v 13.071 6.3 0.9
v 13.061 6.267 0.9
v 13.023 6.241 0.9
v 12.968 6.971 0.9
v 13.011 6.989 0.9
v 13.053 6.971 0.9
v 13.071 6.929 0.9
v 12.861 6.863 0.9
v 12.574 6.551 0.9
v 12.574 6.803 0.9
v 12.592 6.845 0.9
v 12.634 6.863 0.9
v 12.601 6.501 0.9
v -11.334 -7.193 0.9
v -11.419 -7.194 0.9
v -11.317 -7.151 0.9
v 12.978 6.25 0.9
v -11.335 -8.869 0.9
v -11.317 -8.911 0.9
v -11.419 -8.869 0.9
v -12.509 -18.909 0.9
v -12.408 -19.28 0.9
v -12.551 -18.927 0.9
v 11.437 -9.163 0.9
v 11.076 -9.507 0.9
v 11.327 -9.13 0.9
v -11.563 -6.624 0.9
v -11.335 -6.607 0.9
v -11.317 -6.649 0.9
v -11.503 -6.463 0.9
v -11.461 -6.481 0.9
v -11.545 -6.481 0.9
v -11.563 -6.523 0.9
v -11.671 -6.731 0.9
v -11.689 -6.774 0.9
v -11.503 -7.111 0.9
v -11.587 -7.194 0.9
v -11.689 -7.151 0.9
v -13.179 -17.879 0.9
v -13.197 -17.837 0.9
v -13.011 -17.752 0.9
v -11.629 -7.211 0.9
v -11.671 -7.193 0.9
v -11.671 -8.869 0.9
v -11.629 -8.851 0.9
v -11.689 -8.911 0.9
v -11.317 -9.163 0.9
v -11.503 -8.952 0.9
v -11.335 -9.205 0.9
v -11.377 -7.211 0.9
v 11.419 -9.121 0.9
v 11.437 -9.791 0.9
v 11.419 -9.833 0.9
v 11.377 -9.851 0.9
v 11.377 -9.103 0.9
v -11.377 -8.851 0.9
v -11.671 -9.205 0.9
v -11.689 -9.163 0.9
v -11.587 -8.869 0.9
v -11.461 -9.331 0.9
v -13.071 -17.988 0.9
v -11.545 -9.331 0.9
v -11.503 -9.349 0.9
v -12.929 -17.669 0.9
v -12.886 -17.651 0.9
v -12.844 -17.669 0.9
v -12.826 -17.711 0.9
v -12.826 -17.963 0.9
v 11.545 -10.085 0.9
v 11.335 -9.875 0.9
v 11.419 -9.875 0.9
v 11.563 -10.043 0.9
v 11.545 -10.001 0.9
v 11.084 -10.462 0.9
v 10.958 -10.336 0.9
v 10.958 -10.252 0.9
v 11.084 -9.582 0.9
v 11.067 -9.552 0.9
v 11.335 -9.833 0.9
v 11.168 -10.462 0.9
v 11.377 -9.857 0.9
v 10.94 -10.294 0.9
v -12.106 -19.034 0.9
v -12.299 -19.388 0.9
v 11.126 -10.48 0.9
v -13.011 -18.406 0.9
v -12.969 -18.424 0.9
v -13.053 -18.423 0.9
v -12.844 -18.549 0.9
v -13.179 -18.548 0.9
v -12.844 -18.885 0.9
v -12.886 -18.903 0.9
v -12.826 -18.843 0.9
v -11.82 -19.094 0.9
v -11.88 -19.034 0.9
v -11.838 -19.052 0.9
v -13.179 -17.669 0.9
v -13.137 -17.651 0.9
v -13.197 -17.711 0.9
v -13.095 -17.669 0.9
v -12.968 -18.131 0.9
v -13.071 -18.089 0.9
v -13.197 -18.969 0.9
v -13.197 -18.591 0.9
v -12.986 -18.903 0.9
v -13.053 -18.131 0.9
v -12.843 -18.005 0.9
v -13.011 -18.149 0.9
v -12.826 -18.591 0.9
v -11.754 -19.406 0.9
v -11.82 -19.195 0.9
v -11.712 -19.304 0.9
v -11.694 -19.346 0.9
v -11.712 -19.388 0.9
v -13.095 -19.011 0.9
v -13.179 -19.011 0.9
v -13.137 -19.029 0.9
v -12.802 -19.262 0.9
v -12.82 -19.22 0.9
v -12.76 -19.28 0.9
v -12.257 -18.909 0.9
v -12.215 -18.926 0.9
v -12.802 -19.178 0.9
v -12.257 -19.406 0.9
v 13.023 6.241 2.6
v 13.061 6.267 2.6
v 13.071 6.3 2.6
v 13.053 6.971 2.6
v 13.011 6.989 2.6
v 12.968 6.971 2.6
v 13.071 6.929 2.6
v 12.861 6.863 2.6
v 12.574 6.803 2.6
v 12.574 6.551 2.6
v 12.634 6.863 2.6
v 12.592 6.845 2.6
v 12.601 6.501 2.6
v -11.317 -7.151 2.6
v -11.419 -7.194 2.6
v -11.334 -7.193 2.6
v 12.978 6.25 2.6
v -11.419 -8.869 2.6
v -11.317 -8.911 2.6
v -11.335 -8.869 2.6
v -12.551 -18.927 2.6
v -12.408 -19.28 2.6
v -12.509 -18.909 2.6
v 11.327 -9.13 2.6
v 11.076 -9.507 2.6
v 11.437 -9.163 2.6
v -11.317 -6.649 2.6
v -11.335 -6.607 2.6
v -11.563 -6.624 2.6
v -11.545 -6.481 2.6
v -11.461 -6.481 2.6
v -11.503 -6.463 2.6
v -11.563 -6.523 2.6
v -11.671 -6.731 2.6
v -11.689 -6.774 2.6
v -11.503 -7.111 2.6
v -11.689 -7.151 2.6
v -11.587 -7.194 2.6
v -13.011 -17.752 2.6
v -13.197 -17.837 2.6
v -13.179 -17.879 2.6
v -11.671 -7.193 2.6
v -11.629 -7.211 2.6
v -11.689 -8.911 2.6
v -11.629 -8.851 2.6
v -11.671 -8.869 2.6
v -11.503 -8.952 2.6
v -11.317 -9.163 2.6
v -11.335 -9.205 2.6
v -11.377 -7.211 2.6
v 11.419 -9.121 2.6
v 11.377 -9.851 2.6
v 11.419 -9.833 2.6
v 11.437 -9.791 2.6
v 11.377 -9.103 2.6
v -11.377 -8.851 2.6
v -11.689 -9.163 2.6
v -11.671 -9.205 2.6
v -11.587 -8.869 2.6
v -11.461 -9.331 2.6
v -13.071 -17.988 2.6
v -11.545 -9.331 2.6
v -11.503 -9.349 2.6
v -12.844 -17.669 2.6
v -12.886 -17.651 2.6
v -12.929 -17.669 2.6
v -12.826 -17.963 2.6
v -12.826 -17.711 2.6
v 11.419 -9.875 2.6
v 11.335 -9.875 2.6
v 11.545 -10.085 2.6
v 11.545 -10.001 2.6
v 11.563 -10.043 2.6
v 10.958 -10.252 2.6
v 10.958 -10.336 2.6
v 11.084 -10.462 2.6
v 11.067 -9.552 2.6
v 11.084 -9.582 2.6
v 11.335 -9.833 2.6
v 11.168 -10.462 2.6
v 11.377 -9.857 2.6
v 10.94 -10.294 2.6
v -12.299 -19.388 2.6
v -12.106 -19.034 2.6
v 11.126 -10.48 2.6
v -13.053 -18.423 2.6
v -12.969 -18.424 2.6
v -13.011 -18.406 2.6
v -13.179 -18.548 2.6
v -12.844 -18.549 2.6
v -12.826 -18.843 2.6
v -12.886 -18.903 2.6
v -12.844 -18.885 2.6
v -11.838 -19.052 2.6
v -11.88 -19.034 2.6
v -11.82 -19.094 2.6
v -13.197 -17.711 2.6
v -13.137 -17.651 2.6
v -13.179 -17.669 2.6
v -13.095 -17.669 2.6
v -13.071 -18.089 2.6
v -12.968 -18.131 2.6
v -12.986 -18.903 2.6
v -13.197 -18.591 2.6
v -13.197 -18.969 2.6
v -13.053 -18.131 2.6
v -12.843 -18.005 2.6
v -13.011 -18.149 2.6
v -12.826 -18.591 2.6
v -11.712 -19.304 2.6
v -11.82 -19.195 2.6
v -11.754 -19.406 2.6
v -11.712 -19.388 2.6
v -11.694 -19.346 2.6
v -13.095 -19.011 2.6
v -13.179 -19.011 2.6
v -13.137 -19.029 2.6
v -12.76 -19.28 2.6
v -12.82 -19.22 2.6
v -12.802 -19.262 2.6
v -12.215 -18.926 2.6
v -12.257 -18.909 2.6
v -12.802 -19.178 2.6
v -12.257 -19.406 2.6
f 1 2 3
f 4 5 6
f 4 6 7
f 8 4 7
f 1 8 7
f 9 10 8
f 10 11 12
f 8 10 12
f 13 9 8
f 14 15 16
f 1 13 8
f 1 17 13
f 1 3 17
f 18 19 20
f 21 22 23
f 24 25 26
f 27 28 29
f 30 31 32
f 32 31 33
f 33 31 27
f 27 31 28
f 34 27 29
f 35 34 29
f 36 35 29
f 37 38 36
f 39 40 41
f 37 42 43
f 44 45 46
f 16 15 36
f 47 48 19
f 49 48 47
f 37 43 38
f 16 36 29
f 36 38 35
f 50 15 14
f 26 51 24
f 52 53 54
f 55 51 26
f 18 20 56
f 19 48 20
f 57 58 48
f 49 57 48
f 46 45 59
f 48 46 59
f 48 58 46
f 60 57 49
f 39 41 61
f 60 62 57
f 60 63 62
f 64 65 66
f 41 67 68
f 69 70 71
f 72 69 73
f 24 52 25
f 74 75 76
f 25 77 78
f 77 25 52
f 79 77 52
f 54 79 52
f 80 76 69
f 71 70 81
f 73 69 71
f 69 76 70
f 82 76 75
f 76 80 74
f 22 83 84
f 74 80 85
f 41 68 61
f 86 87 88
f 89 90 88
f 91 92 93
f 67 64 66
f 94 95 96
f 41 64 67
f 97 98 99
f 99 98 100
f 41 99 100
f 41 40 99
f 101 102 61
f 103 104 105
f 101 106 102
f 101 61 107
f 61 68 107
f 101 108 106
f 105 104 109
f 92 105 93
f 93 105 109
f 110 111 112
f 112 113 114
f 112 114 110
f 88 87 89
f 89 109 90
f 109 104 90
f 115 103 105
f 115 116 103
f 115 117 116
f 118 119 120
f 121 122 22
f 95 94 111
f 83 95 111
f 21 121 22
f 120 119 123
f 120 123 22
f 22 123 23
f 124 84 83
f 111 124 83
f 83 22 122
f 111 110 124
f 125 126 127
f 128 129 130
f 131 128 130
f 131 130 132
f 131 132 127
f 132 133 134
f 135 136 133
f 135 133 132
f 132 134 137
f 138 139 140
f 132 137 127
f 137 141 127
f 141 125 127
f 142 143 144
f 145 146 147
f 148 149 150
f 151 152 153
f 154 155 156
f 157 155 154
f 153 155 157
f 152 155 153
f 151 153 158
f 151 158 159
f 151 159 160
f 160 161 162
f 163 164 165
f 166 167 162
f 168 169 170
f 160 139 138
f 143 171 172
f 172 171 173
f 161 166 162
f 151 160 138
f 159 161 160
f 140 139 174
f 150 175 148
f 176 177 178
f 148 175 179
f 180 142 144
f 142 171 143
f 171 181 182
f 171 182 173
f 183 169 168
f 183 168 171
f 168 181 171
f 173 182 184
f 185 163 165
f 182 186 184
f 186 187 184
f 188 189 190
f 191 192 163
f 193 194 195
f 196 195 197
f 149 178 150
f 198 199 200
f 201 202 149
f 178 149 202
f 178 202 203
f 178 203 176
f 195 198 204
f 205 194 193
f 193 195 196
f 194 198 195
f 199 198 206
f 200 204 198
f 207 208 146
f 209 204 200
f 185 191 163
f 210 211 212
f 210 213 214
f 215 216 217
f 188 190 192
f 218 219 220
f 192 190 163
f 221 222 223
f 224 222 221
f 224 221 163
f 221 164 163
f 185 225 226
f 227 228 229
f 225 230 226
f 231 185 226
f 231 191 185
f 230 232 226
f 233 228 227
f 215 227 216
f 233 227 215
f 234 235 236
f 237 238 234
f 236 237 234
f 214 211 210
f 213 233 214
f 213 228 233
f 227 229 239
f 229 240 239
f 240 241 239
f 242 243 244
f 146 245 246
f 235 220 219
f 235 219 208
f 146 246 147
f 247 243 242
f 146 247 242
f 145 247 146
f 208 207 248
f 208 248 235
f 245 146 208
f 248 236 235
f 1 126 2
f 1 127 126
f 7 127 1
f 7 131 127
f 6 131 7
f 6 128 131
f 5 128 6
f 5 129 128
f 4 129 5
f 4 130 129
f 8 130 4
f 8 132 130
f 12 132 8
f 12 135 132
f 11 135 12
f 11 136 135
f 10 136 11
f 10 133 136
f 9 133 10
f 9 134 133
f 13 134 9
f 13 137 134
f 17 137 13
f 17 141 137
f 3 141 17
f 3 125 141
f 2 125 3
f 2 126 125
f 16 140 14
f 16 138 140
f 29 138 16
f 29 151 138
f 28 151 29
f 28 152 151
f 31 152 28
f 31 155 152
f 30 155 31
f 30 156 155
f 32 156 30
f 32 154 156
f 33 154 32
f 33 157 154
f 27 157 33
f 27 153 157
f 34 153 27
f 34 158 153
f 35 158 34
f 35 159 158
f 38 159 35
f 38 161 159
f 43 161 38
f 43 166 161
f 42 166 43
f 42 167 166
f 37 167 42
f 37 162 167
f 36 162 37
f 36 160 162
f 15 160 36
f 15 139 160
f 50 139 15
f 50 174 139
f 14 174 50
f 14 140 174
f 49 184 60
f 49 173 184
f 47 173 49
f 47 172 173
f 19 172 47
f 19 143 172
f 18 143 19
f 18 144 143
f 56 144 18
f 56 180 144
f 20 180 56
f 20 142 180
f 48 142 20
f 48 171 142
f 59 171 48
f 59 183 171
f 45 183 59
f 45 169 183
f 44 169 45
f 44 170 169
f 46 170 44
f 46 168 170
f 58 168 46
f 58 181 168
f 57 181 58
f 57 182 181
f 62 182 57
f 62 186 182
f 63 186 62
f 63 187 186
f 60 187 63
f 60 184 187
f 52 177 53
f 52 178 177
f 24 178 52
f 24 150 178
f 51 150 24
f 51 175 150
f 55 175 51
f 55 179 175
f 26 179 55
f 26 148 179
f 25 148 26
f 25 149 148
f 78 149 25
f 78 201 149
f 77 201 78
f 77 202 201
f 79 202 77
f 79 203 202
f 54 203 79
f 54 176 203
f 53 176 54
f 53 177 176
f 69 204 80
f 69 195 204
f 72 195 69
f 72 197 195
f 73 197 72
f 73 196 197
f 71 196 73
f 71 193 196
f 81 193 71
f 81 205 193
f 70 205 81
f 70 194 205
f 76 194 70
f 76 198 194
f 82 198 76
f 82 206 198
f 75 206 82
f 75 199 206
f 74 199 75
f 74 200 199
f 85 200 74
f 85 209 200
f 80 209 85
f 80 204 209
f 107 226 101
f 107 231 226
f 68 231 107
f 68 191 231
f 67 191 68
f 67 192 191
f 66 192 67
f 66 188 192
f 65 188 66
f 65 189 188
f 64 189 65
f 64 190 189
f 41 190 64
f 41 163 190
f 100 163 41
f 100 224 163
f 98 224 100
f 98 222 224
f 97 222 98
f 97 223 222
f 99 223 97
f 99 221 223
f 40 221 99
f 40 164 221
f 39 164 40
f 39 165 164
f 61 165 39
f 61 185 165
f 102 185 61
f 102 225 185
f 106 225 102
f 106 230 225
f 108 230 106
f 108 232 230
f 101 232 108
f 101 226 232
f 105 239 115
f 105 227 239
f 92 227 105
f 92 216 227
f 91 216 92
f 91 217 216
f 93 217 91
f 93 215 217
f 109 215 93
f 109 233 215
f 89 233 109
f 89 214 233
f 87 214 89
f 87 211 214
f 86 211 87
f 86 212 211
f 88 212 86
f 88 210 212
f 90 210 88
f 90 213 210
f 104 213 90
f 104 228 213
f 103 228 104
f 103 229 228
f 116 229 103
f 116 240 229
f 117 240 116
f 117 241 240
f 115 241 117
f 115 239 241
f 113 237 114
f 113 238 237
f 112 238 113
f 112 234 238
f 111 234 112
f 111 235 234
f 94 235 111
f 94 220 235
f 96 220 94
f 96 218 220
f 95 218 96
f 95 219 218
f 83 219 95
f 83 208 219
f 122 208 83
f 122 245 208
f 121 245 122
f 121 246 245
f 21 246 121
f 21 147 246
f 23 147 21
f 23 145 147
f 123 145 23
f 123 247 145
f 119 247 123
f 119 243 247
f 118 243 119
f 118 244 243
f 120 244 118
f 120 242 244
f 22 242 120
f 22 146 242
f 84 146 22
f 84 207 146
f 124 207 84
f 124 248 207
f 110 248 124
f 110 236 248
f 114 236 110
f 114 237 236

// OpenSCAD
$fn = 24;
translate([0, -2.500, 0.900])
  linear_extrude(height=1.700) {
offset(r=0.06, $fn=8) {
    polygon(points=[[-12.760,-16.720],[-12.383,-16.720],[-12.257,-16.846],[-11.000,-16.846],[-11.754,-16.846],[-11.880,-16.720],[-11.880,-16.594],[-12.131,-16.594],[-12.257,-16.469],[-12.509,-16.469]], paths=[[0,1,2,3,4,5,6,7,8,9]]);
    polygon(points=[[-12.886,-14.960],[-12.886,-15.211],[-13.011,-15.337],[-13.137,-15.211],[-13.137,-15.337],[-13.011,-15.463],[-13.011,-15.966],[-13.137,-16.091],[-13.263,-15.966],[-13.263,-15.840],[-13.263,-15.966],[-13.137,-16.091],[-13.137,-16.469],[-13.011,-16.343],[-12.886,-16.343],[-12.886,-16.091],[-13.011,-15.966],[-13.011,-15.589],[-12.886,-15.463]], paths=[[0,1,2,3,4,5,6,7,8,9,10,11,12,13,14,15,16,17,18]]);
    polygon(points=[[11.377,-6.537],[11.377,-6.663],[11.126,-7.040],[11.377,-7.291],[11.377,-7.417],[10.874,-7.920],[11.000,-7.794],[11.126,-7.920],[11.503,-7.543],[11.377,-7.417]], paths=[[0,1,2,3,4,5,6,7,8,9]]);
    polygon(points=[[-11.629,-1.509],[-11.629,-2.263],[-11.754,-2.389],[-11.754,-2.891],[-11.754,-2.389],[-11.629,-2.263],[-11.503,-2.389],[-11.503,-4.149],[-11.629,-4.274],[-11.629,-6.663],[-11.503,-6.789],[-11.503,-7.920],[-11.503,-6.789],[-11.377,-6.663],[-11.377,-5.154],[-11.377,-6.411],[-11.503,-6.537],[-11.629,-6.411],[-11.629,-4.651],[-11.503,-4.526],[-11.377,-4.651],[-11.377,-4.903],[-11.377,-4.149],[-11.503,-4.023],[-11.503,-2.389],[-11.629,-2.263]], paths=[[0,1,2,3,4,5,6,7,8,9,10,11,12,13,14,15,16,17,18,19,20,21,22,23,24,25]]);
    polygon(points=[[13.011,9.429],[12.886,9.303],[12.634,9.303],[12.634,9.051],[13.011,8.800],[13.011,6.663]], paths=[[0,1,2,3,4,5]]);
}
}
